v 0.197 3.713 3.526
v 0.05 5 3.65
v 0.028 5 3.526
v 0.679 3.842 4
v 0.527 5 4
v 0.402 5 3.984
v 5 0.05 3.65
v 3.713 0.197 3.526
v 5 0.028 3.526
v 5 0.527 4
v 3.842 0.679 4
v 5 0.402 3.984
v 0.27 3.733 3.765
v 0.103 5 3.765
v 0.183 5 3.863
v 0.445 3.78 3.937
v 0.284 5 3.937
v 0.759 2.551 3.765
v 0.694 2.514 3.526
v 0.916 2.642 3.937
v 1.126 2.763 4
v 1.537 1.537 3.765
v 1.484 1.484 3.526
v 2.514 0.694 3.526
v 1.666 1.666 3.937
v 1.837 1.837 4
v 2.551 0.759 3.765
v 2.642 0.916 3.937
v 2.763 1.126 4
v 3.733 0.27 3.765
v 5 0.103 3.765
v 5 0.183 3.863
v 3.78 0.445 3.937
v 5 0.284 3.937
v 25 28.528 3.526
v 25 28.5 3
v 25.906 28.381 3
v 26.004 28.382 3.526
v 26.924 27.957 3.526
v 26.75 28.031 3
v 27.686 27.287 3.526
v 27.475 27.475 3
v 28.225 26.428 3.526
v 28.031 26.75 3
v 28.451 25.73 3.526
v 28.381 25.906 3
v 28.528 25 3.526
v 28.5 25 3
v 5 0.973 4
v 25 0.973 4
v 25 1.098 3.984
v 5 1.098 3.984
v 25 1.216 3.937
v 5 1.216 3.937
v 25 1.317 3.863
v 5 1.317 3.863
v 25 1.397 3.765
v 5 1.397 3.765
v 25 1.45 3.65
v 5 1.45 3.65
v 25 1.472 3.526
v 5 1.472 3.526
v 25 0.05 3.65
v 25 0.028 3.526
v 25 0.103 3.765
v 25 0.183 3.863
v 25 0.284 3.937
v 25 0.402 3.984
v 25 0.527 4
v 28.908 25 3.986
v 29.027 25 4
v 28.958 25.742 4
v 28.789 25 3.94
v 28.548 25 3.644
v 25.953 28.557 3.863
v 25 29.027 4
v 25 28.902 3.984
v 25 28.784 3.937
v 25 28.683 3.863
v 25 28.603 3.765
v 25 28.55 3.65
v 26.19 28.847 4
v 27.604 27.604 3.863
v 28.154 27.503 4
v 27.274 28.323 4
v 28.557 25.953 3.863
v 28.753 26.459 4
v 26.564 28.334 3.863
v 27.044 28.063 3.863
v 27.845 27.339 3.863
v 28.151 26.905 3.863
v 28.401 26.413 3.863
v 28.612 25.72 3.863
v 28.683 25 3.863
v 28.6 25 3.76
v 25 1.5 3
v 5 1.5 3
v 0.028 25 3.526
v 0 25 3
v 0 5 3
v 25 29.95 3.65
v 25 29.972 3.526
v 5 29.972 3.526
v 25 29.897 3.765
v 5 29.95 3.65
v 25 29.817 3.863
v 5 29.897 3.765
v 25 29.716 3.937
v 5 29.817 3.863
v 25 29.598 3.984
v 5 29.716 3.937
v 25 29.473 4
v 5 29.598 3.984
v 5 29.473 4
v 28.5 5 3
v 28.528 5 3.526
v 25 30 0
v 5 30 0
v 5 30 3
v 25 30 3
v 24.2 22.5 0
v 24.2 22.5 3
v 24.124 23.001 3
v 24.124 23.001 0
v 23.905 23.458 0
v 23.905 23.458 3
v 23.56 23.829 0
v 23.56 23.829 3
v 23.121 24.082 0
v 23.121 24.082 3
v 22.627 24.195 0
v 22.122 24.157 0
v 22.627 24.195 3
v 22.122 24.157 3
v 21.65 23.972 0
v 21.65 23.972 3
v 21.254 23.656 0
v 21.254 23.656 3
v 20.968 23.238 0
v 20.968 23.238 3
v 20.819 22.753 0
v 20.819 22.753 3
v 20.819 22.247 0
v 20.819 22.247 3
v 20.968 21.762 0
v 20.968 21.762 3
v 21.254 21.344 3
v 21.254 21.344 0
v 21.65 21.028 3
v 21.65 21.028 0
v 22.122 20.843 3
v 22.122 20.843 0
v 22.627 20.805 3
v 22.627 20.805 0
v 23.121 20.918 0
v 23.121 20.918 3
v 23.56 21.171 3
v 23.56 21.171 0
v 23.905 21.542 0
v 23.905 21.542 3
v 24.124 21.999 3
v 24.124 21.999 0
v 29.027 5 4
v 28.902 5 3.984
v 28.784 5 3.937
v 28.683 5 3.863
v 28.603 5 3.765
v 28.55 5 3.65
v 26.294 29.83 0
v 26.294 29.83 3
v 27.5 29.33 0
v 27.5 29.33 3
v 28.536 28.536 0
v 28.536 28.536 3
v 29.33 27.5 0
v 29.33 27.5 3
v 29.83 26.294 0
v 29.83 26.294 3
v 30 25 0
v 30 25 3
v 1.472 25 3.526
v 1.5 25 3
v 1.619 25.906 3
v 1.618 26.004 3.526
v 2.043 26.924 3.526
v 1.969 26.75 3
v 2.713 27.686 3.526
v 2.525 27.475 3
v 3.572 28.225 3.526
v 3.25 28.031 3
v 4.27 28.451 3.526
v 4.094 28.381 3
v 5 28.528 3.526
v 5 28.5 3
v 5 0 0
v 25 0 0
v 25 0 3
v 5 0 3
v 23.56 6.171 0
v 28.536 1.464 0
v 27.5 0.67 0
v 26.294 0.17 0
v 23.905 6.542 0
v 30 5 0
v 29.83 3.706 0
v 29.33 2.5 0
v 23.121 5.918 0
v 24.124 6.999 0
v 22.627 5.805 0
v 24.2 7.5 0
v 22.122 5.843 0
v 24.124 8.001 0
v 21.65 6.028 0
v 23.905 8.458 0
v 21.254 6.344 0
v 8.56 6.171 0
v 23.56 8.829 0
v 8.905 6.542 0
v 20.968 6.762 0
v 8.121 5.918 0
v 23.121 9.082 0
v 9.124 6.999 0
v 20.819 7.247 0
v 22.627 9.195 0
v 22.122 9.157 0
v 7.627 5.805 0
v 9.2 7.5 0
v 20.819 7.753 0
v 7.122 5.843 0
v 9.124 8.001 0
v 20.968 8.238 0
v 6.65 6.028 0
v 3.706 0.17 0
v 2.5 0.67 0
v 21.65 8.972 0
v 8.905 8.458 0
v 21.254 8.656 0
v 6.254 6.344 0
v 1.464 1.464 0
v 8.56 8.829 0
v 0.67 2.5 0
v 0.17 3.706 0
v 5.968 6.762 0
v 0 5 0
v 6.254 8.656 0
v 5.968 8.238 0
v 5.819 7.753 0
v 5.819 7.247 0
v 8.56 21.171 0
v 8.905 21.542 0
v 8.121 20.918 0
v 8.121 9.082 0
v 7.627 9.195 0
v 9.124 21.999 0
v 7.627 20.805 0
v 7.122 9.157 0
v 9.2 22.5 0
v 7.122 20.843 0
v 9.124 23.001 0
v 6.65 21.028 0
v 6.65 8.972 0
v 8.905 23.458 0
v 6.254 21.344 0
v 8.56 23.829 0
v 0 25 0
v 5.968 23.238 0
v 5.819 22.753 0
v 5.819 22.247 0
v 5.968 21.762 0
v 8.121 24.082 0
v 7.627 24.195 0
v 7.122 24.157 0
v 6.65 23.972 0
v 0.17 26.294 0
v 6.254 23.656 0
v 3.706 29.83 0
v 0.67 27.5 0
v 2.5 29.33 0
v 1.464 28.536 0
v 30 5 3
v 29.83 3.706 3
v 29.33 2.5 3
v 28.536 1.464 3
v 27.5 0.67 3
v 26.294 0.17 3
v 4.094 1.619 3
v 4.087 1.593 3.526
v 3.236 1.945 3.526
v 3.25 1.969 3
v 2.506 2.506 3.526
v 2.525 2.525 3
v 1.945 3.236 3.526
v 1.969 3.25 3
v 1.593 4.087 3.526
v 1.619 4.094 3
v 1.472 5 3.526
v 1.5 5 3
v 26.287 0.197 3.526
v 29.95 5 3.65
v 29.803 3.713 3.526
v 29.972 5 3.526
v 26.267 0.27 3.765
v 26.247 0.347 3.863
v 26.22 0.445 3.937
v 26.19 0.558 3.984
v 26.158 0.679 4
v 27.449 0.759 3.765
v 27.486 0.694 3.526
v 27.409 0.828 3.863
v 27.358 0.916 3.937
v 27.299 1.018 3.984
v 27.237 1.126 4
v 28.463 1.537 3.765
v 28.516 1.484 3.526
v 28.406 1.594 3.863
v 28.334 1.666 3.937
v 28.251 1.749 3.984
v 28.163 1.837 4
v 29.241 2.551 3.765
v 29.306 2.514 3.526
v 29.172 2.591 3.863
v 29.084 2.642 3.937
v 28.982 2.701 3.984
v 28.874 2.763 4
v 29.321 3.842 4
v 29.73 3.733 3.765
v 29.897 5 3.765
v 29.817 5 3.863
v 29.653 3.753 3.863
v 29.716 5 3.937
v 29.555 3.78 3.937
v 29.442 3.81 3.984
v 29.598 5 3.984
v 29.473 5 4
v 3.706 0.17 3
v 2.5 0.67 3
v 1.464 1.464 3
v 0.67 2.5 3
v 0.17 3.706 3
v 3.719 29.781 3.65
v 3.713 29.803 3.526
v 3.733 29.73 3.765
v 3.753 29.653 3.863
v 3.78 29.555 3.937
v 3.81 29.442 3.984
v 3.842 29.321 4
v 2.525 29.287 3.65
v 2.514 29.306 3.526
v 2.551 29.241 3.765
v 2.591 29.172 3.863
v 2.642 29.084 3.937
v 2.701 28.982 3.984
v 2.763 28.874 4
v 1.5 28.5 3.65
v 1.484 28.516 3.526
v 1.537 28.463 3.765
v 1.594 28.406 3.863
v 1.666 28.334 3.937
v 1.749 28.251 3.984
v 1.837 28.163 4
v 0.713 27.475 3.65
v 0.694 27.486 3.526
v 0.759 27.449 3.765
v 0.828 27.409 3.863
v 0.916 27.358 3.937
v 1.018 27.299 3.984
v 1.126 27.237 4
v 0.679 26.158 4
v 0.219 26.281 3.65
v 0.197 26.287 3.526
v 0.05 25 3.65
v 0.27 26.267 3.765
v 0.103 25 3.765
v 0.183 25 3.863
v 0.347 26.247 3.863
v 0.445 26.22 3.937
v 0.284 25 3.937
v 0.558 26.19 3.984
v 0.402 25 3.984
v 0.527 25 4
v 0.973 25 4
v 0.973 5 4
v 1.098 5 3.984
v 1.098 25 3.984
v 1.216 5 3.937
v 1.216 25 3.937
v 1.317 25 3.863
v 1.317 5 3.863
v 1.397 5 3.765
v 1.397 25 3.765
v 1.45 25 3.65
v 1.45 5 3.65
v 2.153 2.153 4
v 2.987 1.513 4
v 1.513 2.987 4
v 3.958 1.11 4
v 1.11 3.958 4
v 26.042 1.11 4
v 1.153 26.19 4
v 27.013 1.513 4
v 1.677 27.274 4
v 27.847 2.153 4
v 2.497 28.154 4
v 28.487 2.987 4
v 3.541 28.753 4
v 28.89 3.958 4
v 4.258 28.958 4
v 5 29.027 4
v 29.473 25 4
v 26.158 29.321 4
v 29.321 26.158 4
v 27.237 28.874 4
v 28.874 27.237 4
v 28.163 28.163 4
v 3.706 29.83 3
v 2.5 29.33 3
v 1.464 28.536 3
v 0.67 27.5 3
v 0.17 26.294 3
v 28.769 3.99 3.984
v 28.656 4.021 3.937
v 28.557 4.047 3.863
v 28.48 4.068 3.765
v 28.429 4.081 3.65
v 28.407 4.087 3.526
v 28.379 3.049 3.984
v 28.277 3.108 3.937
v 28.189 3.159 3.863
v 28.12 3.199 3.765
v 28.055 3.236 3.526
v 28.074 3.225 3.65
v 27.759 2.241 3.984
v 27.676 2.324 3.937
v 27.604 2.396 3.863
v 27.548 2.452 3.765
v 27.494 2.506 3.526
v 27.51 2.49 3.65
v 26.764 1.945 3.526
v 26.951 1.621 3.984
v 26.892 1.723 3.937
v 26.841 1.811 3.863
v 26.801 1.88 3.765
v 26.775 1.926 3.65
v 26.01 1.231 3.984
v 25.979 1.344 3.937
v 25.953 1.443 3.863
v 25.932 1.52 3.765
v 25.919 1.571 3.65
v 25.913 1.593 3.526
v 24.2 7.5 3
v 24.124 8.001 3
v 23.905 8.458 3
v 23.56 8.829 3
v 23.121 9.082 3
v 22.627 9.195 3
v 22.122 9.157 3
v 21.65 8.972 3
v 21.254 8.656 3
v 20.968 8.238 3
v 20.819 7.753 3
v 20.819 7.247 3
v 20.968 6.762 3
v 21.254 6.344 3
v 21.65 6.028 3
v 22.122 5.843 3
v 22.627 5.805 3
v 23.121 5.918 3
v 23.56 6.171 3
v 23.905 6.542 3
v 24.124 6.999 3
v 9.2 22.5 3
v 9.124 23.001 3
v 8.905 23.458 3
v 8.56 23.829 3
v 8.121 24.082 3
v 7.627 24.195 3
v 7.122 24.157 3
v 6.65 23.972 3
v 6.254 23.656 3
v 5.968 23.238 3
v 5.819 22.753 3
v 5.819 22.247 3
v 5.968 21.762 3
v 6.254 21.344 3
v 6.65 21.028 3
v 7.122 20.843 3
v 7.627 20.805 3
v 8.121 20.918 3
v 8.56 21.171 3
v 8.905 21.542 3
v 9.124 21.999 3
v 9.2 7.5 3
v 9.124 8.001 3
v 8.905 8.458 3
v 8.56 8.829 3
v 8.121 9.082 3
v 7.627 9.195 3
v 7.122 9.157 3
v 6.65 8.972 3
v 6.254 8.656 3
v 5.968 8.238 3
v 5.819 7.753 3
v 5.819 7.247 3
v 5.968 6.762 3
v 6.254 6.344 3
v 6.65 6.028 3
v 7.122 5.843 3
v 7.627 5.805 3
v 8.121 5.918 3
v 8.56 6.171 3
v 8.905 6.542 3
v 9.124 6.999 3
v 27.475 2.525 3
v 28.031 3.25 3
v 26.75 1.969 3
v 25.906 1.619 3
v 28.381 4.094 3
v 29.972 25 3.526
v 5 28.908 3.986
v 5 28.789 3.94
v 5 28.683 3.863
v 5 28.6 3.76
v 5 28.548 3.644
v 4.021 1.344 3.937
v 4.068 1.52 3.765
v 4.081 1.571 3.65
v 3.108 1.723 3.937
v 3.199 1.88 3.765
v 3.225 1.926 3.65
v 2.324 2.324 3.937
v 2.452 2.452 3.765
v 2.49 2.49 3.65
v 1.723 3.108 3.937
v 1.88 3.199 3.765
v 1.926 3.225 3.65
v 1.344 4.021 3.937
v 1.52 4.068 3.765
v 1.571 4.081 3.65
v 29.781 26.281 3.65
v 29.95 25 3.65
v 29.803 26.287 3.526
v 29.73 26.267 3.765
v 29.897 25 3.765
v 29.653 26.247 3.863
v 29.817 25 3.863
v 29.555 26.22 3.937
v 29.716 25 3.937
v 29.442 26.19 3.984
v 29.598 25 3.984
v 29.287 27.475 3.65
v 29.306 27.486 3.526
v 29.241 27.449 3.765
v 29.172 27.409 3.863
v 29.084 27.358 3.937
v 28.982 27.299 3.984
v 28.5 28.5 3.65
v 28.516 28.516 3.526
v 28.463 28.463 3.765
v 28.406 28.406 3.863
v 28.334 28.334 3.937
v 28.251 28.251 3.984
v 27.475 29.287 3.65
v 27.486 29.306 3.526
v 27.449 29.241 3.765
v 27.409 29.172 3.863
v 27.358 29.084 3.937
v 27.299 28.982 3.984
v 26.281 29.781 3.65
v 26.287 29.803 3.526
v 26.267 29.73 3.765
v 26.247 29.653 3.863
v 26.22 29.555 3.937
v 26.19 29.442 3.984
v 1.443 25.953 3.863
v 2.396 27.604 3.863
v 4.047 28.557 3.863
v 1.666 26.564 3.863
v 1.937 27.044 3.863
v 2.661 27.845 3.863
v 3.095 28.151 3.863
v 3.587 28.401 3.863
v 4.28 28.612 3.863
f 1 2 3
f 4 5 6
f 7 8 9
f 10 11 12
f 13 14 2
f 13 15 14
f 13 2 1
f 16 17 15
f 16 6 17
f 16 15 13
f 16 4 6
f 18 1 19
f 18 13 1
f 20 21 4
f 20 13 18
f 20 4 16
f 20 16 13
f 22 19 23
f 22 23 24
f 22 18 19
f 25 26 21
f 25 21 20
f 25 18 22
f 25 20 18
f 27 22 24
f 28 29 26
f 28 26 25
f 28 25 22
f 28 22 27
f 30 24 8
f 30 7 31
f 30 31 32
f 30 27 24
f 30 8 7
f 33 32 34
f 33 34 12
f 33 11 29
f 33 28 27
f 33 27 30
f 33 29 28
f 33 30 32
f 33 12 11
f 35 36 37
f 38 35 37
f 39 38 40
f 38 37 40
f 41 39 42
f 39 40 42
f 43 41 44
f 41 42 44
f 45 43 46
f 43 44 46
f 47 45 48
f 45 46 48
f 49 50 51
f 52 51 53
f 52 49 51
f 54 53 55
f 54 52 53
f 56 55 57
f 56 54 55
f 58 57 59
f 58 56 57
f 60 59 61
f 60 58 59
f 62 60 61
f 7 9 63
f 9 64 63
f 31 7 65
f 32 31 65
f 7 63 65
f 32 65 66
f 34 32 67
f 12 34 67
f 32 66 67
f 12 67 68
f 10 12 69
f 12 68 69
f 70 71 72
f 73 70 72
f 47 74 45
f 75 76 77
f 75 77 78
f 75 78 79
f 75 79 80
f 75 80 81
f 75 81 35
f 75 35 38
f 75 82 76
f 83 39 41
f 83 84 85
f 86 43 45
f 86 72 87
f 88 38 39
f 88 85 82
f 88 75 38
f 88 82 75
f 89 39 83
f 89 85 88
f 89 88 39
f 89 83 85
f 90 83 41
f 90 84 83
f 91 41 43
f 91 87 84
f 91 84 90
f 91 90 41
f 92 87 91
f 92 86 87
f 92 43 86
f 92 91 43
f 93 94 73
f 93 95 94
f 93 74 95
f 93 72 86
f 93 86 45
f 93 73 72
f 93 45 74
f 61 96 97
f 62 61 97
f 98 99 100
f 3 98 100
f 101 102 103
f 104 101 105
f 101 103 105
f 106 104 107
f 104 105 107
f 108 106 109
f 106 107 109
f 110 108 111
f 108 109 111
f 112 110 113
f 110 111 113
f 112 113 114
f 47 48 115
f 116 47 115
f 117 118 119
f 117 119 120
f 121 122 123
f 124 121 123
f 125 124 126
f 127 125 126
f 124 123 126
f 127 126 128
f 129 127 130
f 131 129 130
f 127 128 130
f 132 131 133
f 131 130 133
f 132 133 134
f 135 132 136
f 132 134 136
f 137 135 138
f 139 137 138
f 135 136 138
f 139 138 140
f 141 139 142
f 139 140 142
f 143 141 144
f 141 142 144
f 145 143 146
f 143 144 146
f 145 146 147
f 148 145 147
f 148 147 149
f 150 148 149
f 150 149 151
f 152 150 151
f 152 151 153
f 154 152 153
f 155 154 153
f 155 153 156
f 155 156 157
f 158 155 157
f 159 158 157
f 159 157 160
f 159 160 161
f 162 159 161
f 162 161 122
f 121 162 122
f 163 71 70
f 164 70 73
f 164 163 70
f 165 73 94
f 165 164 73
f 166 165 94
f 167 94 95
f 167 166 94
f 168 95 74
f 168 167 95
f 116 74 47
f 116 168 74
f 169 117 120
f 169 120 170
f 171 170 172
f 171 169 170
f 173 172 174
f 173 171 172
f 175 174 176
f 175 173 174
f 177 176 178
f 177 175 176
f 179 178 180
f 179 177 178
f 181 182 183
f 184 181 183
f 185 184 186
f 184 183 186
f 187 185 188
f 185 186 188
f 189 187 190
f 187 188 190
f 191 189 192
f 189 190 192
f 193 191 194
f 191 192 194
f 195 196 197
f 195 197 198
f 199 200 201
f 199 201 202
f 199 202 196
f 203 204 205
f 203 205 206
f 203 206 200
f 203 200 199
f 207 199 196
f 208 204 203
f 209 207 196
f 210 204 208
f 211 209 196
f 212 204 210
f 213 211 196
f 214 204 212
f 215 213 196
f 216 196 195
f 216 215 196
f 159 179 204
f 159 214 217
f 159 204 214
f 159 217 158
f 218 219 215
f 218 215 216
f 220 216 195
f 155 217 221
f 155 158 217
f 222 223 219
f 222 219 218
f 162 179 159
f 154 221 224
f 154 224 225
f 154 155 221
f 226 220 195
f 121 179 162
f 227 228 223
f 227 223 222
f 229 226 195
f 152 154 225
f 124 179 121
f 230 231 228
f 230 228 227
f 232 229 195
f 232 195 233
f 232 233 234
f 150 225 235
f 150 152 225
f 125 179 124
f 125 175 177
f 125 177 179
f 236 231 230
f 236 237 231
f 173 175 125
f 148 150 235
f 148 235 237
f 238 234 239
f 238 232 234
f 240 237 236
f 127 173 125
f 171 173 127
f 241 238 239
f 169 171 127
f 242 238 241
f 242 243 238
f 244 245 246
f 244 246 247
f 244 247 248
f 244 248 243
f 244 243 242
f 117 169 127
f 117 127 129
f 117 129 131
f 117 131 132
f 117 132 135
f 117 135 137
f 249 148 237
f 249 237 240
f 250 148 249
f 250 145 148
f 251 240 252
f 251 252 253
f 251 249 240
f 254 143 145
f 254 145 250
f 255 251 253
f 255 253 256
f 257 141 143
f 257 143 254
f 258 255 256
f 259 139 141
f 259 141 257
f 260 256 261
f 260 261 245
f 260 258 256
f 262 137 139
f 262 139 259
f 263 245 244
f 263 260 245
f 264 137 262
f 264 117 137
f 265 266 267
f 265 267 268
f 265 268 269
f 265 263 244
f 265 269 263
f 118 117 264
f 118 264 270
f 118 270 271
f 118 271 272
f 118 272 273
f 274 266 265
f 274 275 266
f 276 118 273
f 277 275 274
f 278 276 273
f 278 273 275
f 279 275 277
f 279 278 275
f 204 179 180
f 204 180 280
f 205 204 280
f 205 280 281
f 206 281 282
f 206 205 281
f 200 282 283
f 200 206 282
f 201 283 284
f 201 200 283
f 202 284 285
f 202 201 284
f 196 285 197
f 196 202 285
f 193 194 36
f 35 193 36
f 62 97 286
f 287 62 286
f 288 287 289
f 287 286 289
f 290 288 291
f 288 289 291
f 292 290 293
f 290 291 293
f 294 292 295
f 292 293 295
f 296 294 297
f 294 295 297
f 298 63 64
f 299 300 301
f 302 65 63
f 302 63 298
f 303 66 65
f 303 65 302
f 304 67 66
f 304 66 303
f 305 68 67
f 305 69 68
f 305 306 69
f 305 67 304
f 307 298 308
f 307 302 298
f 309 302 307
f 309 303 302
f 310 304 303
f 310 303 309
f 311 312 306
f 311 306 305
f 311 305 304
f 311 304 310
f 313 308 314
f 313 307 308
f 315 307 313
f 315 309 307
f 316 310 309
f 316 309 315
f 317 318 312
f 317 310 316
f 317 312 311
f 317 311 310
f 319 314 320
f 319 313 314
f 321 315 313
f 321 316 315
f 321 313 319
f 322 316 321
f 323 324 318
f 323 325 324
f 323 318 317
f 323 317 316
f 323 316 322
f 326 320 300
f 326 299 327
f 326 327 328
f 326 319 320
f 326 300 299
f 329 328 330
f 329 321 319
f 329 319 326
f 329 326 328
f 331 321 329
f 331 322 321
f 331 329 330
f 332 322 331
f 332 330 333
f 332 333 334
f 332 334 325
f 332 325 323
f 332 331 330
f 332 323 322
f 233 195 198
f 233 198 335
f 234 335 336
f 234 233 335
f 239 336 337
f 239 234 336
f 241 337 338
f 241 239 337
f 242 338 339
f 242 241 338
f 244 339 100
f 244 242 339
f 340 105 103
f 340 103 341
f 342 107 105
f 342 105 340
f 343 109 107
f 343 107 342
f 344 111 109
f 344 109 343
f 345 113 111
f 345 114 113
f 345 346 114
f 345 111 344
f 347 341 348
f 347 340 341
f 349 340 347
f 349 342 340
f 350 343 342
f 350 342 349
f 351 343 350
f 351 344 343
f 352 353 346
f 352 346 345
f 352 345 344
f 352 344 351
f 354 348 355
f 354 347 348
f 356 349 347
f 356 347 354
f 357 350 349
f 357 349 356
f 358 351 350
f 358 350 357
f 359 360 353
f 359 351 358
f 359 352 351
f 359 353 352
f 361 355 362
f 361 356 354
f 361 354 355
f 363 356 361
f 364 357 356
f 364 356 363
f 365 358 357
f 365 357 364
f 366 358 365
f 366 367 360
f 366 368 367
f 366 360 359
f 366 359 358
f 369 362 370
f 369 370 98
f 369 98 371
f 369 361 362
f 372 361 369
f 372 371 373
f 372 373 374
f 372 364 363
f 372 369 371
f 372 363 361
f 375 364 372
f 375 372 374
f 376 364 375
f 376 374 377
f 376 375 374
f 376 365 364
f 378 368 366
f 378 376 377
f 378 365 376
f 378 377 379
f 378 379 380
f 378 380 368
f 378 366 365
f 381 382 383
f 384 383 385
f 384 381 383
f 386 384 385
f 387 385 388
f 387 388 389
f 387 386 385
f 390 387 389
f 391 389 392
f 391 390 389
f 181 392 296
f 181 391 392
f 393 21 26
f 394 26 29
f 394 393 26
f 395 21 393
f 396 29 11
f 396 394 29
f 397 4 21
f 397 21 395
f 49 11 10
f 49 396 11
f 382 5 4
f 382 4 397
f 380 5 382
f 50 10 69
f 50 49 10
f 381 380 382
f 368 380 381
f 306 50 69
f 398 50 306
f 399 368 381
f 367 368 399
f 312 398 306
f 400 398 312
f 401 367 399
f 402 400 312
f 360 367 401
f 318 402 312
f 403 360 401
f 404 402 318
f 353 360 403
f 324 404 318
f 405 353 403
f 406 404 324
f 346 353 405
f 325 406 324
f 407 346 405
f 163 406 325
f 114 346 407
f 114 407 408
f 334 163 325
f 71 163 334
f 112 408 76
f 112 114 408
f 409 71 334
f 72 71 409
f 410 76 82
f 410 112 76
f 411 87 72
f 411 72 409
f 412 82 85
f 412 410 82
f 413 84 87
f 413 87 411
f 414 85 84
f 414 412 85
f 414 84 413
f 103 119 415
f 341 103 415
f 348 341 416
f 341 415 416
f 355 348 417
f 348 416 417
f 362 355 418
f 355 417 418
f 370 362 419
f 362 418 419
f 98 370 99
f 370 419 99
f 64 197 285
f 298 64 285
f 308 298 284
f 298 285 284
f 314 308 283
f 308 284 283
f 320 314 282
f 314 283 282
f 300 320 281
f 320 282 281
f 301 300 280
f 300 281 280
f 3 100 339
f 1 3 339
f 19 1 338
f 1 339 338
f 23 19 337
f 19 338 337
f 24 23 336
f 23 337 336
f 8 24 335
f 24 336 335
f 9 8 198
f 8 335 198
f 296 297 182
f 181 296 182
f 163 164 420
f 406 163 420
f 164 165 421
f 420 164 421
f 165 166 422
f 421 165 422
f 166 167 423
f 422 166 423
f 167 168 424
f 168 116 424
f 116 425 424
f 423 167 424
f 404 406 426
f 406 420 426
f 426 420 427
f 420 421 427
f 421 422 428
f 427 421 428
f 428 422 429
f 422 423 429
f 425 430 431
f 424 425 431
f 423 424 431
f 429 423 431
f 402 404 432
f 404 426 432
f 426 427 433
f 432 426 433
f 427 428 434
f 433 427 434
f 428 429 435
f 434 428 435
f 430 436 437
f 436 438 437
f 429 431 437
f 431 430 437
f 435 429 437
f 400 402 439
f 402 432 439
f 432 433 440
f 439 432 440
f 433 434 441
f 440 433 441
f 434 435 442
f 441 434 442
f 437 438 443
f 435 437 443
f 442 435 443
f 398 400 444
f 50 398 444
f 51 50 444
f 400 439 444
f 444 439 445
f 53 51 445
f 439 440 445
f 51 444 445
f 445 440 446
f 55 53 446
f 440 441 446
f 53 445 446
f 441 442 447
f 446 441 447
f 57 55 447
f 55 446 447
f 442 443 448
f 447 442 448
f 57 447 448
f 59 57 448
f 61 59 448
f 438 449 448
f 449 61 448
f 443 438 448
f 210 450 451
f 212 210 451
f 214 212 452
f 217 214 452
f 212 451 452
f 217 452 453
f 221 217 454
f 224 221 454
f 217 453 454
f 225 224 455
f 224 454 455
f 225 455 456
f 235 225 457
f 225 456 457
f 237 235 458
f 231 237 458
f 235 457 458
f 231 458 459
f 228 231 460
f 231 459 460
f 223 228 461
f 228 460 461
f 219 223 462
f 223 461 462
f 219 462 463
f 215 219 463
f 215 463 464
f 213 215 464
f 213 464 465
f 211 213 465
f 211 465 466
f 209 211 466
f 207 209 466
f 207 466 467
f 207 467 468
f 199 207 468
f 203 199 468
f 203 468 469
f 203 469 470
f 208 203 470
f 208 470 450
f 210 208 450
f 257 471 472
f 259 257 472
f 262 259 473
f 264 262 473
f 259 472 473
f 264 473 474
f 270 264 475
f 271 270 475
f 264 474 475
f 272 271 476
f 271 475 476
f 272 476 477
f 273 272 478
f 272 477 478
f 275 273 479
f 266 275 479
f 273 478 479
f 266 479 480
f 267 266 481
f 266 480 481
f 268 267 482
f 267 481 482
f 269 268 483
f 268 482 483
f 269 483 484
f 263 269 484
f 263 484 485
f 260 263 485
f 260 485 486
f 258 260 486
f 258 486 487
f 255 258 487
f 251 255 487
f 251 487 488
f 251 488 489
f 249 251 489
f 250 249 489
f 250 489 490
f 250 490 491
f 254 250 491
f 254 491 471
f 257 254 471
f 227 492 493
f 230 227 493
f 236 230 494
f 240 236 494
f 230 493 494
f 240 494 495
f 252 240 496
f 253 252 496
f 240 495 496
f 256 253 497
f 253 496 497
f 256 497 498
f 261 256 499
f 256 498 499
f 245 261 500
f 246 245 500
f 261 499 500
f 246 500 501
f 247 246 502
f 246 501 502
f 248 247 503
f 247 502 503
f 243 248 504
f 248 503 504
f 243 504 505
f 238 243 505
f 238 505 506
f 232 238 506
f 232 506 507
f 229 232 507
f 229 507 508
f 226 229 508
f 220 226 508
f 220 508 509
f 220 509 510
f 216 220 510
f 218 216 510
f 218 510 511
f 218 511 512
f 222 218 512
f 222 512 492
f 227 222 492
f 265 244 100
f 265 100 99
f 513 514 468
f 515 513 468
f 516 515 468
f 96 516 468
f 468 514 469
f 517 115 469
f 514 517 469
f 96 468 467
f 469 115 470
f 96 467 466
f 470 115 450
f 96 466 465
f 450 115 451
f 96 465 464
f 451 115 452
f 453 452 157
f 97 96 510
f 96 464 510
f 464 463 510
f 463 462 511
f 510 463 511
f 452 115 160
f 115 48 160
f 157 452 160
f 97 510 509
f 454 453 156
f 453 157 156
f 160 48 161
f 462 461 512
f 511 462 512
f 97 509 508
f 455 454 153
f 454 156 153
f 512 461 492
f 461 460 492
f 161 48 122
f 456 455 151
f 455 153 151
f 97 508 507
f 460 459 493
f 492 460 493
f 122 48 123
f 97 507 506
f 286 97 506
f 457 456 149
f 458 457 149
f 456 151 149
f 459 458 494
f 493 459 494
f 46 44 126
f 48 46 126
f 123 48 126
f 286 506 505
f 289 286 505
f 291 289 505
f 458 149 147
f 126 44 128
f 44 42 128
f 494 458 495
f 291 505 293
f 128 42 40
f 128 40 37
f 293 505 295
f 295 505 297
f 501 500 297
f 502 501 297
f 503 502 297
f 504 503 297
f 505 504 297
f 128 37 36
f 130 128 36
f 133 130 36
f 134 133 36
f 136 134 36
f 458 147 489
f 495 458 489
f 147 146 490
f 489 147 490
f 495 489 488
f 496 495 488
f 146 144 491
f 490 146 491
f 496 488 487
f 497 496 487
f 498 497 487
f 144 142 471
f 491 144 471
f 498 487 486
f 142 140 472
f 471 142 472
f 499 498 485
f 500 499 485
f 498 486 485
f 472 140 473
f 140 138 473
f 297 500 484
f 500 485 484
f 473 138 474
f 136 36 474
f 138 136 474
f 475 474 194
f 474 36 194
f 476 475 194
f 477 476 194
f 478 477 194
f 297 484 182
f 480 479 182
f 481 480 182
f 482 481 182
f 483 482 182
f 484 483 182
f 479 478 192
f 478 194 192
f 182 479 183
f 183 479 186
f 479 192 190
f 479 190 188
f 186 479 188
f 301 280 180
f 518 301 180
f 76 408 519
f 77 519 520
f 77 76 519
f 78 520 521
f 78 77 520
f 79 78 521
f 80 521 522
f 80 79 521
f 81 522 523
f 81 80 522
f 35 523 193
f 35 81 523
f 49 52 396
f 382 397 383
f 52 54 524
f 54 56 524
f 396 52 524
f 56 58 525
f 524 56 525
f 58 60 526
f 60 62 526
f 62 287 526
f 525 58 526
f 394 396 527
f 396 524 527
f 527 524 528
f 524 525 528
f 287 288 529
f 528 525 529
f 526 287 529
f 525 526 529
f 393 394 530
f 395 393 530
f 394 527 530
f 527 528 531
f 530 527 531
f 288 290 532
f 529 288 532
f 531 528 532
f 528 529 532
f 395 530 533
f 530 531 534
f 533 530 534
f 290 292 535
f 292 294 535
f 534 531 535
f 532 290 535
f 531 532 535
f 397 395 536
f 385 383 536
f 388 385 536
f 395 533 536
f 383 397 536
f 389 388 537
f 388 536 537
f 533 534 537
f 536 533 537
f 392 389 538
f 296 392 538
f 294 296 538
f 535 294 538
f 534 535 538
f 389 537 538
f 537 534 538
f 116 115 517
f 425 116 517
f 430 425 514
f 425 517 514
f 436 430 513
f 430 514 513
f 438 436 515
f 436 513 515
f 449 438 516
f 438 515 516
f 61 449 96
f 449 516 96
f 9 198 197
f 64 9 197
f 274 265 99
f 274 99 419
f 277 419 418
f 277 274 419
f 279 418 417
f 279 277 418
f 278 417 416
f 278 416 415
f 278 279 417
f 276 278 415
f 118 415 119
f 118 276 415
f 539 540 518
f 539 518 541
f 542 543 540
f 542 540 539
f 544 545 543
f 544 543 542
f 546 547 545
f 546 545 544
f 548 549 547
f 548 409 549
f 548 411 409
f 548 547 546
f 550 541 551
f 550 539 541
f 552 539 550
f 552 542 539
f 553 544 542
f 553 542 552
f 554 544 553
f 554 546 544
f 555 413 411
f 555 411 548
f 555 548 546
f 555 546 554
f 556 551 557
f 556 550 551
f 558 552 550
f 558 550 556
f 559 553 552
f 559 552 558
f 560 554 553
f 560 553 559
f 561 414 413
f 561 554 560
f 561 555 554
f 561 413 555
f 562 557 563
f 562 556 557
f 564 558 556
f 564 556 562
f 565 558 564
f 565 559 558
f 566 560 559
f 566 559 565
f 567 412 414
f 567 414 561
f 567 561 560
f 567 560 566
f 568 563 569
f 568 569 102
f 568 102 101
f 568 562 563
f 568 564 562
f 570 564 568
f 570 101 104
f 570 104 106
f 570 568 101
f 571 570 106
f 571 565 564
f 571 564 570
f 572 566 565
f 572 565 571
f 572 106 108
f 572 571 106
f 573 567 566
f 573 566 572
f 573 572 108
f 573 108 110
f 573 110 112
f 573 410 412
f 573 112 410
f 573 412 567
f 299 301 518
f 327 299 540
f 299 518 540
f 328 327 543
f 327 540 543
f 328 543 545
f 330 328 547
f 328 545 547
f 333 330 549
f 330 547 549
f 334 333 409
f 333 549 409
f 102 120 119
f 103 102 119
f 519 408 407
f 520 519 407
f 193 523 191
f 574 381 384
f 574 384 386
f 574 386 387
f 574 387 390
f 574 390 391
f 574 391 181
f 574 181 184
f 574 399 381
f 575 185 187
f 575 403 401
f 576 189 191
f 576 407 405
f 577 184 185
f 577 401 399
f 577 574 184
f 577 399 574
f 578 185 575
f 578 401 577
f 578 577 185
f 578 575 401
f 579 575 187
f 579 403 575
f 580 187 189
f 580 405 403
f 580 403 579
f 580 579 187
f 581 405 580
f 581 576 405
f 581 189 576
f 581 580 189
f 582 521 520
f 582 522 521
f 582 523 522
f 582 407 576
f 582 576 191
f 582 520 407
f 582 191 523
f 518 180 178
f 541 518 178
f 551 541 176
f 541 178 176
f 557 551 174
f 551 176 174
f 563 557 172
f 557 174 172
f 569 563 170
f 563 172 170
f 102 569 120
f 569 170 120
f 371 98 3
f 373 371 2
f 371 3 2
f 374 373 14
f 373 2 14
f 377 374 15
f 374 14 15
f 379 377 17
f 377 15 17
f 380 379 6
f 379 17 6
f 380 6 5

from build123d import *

# Parameters (mm, degrees)
BOSS_EXTRUDE1_DEPTH = 3
SKETCH2_R           = 1.7
CUT_EXTRUDE1_DEPTH  = 43.532340636
BOSS_EXTRUDE2_DEPTH = 1
BOSS_EXTRUDE2_DRAFT = 3
FILLET1_R           = 0.5


with BuildPart() as part:
    # Sketch1 → Boss-Extrude1 (new body)
    with BuildSketch(Plane.XY):
        with BuildLine():
            Line((5, 30), (25, 30))
            ThreePointArc((25, 30), (28.535533906, 28.535533906), (30, 25))
            Line((30, 25), (30, 5))
            ThreePointArc((30, 5), (28.535533906, 1.464466094), (25, 0))
            Line((25, 0), (5, 0))
            ThreePointArc((5, 0), (1.464466094, 1.464466094), (0, 5))
            Line((0, 5), (0, 25))
            ThreePointArc((0, 25), (1.464466094, 28.535533906), (5, 30))
        make_face()
    extrude(amount=BOSS_EXTRUDE1_DEPTH)

    # Sketch2 → Cut-Extrude1 (cut, through all)
    with BuildSketch(Plane.XY.offset(3)):
        with Locations((22.5, 22.5)):
            Circle(SKETCH2_R)
        with Locations((7.5, 7.5)):
            Circle(SKETCH2_R)
        with Locations((7.5, 22.5)):
            Circle(SKETCH2_R)
        with Locations((22.5, 7.5)):
            Circle(SKETCH2_R)
    extrude(amount=-CUT_EXTRUDE1_DEPTH, mode=Mode.SUBTRACT)


with BuildPart() as boss_extrude2_tool:
    # Sketch3 → Boss-Extrude2 (with draft: the straight prism first)
    with BuildSketch(Plane.XY.offset(3)):
        with BuildLine():
            Line((30, 5), (30, 25))
            ThreePointArc((30, 25), (28.535533906, 28.535533906), (25, 30))
            Line((25, 30), (5, 30))
            ThreePointArc((5, 30), (1.464466094, 28.535533906), (0, 25))
            Line((0, 25), (0, 5))
            ThreePointArc((0, 5), (1.464466094, 1.464466094), (5, 0))
            Line((5, 0), (25, 0))
            ThreePointArc((25, 0), (28.535533906, 1.464466094), (30, 5))
        make_face()
        with BuildLine():
            Line((28.5, 25), (28.5, 5))
            ThreePointArc((28.5, 5), (27.474873734, 2.525126266), (25, 1.5))
            Line((25, 1.5), (5, 1.5))
            ThreePointArc((5, 1.5), (2.525126266, 2.525126266), (1.5, 5))
            Line((1.5, 5), (1.5, 25))
            ThreePointArc((1.5, 25), (2.525126266, 27.474873734), (5, 28.5))
            Line((5, 28.5), (25, 28.5))
            ThreePointArc((25, 28.5), (27.474873734, 27.474873734), (28.5, 25))
        make_face(mode=Mode.SUBTRACT)
    extrude(amount=BOSS_EXTRUDE2_DEPTH)
    # Boss-Extrude2: the draft: its side faces are tilted about the plane it starts from
    boss_extrude2_sides = [boss_extrude2_tool.faces().sort_by_distance(p)[0] for p in [
        (15, 0, 3.5),
        (28.535533906, 1.464466094, 3.5),
        (30, 15, 3.5),
        (28.535533906, 28.535533906, 3.5),
        (15, 30, 3.5),
        (1.464466094, 28.535533906, 3.5),
        (0, 15, 3.5),
        (1.464466094, 1.464466094, 3.5),
        (28.5, 15, 3.5),
        (27.474873734, 2.525126266, 3.5),
        (15, 1.5, 3.5),
        (2.525126266, 2.525126266, 3.5),
        (1.5, 15, 3.5),
        (2.525126266, 27.474873734, 3.5),
        (15, 28.5, 3.5),
        (27.474873734, 27.474873734, 3.5),
    ]]
    draft(boss_extrude2_sides, Plane.XY.offset(3), BOSS_EXTRUDE2_DRAFT)


with BuildPart() as part_1:
    add(part.part)

    # Boss-Extrude2: add boss_extrude2_tool
    add(boss_extrude2_tool.part)

    # Fillet1
    fillet1_edges = [part_1.edges().sort_by_distance(p)[0] for p in [
        (28.49847601, 1.50152399, 4),
        (29.947592221, 15, 4),
        (28.49847601, 28.49847601, 4),
        (15, 29.947592221, 4),
        (1.50152399, 28.49847601, 4),
        (0.052407779, 15, 4),
        (1.50152399, 1.50152399, 4),
        (15, 0.052407779, 4),
        (2.48806837, 2.48806837, 4),
        (15, 1.447592221, 4),
        (27.51193163, 2.48806837, 4),
        (28.552407779, 15, 4),
        (27.51193163, 27.51193163, 4),
        (15, 28.552407779, 4),
        (2.48806837, 27.51193163, 4),
        (1.447592221, 15, 4),
    ]]
    fillet(fillet1_edges, radius=FILLET1_R)


solid = part_1.part
